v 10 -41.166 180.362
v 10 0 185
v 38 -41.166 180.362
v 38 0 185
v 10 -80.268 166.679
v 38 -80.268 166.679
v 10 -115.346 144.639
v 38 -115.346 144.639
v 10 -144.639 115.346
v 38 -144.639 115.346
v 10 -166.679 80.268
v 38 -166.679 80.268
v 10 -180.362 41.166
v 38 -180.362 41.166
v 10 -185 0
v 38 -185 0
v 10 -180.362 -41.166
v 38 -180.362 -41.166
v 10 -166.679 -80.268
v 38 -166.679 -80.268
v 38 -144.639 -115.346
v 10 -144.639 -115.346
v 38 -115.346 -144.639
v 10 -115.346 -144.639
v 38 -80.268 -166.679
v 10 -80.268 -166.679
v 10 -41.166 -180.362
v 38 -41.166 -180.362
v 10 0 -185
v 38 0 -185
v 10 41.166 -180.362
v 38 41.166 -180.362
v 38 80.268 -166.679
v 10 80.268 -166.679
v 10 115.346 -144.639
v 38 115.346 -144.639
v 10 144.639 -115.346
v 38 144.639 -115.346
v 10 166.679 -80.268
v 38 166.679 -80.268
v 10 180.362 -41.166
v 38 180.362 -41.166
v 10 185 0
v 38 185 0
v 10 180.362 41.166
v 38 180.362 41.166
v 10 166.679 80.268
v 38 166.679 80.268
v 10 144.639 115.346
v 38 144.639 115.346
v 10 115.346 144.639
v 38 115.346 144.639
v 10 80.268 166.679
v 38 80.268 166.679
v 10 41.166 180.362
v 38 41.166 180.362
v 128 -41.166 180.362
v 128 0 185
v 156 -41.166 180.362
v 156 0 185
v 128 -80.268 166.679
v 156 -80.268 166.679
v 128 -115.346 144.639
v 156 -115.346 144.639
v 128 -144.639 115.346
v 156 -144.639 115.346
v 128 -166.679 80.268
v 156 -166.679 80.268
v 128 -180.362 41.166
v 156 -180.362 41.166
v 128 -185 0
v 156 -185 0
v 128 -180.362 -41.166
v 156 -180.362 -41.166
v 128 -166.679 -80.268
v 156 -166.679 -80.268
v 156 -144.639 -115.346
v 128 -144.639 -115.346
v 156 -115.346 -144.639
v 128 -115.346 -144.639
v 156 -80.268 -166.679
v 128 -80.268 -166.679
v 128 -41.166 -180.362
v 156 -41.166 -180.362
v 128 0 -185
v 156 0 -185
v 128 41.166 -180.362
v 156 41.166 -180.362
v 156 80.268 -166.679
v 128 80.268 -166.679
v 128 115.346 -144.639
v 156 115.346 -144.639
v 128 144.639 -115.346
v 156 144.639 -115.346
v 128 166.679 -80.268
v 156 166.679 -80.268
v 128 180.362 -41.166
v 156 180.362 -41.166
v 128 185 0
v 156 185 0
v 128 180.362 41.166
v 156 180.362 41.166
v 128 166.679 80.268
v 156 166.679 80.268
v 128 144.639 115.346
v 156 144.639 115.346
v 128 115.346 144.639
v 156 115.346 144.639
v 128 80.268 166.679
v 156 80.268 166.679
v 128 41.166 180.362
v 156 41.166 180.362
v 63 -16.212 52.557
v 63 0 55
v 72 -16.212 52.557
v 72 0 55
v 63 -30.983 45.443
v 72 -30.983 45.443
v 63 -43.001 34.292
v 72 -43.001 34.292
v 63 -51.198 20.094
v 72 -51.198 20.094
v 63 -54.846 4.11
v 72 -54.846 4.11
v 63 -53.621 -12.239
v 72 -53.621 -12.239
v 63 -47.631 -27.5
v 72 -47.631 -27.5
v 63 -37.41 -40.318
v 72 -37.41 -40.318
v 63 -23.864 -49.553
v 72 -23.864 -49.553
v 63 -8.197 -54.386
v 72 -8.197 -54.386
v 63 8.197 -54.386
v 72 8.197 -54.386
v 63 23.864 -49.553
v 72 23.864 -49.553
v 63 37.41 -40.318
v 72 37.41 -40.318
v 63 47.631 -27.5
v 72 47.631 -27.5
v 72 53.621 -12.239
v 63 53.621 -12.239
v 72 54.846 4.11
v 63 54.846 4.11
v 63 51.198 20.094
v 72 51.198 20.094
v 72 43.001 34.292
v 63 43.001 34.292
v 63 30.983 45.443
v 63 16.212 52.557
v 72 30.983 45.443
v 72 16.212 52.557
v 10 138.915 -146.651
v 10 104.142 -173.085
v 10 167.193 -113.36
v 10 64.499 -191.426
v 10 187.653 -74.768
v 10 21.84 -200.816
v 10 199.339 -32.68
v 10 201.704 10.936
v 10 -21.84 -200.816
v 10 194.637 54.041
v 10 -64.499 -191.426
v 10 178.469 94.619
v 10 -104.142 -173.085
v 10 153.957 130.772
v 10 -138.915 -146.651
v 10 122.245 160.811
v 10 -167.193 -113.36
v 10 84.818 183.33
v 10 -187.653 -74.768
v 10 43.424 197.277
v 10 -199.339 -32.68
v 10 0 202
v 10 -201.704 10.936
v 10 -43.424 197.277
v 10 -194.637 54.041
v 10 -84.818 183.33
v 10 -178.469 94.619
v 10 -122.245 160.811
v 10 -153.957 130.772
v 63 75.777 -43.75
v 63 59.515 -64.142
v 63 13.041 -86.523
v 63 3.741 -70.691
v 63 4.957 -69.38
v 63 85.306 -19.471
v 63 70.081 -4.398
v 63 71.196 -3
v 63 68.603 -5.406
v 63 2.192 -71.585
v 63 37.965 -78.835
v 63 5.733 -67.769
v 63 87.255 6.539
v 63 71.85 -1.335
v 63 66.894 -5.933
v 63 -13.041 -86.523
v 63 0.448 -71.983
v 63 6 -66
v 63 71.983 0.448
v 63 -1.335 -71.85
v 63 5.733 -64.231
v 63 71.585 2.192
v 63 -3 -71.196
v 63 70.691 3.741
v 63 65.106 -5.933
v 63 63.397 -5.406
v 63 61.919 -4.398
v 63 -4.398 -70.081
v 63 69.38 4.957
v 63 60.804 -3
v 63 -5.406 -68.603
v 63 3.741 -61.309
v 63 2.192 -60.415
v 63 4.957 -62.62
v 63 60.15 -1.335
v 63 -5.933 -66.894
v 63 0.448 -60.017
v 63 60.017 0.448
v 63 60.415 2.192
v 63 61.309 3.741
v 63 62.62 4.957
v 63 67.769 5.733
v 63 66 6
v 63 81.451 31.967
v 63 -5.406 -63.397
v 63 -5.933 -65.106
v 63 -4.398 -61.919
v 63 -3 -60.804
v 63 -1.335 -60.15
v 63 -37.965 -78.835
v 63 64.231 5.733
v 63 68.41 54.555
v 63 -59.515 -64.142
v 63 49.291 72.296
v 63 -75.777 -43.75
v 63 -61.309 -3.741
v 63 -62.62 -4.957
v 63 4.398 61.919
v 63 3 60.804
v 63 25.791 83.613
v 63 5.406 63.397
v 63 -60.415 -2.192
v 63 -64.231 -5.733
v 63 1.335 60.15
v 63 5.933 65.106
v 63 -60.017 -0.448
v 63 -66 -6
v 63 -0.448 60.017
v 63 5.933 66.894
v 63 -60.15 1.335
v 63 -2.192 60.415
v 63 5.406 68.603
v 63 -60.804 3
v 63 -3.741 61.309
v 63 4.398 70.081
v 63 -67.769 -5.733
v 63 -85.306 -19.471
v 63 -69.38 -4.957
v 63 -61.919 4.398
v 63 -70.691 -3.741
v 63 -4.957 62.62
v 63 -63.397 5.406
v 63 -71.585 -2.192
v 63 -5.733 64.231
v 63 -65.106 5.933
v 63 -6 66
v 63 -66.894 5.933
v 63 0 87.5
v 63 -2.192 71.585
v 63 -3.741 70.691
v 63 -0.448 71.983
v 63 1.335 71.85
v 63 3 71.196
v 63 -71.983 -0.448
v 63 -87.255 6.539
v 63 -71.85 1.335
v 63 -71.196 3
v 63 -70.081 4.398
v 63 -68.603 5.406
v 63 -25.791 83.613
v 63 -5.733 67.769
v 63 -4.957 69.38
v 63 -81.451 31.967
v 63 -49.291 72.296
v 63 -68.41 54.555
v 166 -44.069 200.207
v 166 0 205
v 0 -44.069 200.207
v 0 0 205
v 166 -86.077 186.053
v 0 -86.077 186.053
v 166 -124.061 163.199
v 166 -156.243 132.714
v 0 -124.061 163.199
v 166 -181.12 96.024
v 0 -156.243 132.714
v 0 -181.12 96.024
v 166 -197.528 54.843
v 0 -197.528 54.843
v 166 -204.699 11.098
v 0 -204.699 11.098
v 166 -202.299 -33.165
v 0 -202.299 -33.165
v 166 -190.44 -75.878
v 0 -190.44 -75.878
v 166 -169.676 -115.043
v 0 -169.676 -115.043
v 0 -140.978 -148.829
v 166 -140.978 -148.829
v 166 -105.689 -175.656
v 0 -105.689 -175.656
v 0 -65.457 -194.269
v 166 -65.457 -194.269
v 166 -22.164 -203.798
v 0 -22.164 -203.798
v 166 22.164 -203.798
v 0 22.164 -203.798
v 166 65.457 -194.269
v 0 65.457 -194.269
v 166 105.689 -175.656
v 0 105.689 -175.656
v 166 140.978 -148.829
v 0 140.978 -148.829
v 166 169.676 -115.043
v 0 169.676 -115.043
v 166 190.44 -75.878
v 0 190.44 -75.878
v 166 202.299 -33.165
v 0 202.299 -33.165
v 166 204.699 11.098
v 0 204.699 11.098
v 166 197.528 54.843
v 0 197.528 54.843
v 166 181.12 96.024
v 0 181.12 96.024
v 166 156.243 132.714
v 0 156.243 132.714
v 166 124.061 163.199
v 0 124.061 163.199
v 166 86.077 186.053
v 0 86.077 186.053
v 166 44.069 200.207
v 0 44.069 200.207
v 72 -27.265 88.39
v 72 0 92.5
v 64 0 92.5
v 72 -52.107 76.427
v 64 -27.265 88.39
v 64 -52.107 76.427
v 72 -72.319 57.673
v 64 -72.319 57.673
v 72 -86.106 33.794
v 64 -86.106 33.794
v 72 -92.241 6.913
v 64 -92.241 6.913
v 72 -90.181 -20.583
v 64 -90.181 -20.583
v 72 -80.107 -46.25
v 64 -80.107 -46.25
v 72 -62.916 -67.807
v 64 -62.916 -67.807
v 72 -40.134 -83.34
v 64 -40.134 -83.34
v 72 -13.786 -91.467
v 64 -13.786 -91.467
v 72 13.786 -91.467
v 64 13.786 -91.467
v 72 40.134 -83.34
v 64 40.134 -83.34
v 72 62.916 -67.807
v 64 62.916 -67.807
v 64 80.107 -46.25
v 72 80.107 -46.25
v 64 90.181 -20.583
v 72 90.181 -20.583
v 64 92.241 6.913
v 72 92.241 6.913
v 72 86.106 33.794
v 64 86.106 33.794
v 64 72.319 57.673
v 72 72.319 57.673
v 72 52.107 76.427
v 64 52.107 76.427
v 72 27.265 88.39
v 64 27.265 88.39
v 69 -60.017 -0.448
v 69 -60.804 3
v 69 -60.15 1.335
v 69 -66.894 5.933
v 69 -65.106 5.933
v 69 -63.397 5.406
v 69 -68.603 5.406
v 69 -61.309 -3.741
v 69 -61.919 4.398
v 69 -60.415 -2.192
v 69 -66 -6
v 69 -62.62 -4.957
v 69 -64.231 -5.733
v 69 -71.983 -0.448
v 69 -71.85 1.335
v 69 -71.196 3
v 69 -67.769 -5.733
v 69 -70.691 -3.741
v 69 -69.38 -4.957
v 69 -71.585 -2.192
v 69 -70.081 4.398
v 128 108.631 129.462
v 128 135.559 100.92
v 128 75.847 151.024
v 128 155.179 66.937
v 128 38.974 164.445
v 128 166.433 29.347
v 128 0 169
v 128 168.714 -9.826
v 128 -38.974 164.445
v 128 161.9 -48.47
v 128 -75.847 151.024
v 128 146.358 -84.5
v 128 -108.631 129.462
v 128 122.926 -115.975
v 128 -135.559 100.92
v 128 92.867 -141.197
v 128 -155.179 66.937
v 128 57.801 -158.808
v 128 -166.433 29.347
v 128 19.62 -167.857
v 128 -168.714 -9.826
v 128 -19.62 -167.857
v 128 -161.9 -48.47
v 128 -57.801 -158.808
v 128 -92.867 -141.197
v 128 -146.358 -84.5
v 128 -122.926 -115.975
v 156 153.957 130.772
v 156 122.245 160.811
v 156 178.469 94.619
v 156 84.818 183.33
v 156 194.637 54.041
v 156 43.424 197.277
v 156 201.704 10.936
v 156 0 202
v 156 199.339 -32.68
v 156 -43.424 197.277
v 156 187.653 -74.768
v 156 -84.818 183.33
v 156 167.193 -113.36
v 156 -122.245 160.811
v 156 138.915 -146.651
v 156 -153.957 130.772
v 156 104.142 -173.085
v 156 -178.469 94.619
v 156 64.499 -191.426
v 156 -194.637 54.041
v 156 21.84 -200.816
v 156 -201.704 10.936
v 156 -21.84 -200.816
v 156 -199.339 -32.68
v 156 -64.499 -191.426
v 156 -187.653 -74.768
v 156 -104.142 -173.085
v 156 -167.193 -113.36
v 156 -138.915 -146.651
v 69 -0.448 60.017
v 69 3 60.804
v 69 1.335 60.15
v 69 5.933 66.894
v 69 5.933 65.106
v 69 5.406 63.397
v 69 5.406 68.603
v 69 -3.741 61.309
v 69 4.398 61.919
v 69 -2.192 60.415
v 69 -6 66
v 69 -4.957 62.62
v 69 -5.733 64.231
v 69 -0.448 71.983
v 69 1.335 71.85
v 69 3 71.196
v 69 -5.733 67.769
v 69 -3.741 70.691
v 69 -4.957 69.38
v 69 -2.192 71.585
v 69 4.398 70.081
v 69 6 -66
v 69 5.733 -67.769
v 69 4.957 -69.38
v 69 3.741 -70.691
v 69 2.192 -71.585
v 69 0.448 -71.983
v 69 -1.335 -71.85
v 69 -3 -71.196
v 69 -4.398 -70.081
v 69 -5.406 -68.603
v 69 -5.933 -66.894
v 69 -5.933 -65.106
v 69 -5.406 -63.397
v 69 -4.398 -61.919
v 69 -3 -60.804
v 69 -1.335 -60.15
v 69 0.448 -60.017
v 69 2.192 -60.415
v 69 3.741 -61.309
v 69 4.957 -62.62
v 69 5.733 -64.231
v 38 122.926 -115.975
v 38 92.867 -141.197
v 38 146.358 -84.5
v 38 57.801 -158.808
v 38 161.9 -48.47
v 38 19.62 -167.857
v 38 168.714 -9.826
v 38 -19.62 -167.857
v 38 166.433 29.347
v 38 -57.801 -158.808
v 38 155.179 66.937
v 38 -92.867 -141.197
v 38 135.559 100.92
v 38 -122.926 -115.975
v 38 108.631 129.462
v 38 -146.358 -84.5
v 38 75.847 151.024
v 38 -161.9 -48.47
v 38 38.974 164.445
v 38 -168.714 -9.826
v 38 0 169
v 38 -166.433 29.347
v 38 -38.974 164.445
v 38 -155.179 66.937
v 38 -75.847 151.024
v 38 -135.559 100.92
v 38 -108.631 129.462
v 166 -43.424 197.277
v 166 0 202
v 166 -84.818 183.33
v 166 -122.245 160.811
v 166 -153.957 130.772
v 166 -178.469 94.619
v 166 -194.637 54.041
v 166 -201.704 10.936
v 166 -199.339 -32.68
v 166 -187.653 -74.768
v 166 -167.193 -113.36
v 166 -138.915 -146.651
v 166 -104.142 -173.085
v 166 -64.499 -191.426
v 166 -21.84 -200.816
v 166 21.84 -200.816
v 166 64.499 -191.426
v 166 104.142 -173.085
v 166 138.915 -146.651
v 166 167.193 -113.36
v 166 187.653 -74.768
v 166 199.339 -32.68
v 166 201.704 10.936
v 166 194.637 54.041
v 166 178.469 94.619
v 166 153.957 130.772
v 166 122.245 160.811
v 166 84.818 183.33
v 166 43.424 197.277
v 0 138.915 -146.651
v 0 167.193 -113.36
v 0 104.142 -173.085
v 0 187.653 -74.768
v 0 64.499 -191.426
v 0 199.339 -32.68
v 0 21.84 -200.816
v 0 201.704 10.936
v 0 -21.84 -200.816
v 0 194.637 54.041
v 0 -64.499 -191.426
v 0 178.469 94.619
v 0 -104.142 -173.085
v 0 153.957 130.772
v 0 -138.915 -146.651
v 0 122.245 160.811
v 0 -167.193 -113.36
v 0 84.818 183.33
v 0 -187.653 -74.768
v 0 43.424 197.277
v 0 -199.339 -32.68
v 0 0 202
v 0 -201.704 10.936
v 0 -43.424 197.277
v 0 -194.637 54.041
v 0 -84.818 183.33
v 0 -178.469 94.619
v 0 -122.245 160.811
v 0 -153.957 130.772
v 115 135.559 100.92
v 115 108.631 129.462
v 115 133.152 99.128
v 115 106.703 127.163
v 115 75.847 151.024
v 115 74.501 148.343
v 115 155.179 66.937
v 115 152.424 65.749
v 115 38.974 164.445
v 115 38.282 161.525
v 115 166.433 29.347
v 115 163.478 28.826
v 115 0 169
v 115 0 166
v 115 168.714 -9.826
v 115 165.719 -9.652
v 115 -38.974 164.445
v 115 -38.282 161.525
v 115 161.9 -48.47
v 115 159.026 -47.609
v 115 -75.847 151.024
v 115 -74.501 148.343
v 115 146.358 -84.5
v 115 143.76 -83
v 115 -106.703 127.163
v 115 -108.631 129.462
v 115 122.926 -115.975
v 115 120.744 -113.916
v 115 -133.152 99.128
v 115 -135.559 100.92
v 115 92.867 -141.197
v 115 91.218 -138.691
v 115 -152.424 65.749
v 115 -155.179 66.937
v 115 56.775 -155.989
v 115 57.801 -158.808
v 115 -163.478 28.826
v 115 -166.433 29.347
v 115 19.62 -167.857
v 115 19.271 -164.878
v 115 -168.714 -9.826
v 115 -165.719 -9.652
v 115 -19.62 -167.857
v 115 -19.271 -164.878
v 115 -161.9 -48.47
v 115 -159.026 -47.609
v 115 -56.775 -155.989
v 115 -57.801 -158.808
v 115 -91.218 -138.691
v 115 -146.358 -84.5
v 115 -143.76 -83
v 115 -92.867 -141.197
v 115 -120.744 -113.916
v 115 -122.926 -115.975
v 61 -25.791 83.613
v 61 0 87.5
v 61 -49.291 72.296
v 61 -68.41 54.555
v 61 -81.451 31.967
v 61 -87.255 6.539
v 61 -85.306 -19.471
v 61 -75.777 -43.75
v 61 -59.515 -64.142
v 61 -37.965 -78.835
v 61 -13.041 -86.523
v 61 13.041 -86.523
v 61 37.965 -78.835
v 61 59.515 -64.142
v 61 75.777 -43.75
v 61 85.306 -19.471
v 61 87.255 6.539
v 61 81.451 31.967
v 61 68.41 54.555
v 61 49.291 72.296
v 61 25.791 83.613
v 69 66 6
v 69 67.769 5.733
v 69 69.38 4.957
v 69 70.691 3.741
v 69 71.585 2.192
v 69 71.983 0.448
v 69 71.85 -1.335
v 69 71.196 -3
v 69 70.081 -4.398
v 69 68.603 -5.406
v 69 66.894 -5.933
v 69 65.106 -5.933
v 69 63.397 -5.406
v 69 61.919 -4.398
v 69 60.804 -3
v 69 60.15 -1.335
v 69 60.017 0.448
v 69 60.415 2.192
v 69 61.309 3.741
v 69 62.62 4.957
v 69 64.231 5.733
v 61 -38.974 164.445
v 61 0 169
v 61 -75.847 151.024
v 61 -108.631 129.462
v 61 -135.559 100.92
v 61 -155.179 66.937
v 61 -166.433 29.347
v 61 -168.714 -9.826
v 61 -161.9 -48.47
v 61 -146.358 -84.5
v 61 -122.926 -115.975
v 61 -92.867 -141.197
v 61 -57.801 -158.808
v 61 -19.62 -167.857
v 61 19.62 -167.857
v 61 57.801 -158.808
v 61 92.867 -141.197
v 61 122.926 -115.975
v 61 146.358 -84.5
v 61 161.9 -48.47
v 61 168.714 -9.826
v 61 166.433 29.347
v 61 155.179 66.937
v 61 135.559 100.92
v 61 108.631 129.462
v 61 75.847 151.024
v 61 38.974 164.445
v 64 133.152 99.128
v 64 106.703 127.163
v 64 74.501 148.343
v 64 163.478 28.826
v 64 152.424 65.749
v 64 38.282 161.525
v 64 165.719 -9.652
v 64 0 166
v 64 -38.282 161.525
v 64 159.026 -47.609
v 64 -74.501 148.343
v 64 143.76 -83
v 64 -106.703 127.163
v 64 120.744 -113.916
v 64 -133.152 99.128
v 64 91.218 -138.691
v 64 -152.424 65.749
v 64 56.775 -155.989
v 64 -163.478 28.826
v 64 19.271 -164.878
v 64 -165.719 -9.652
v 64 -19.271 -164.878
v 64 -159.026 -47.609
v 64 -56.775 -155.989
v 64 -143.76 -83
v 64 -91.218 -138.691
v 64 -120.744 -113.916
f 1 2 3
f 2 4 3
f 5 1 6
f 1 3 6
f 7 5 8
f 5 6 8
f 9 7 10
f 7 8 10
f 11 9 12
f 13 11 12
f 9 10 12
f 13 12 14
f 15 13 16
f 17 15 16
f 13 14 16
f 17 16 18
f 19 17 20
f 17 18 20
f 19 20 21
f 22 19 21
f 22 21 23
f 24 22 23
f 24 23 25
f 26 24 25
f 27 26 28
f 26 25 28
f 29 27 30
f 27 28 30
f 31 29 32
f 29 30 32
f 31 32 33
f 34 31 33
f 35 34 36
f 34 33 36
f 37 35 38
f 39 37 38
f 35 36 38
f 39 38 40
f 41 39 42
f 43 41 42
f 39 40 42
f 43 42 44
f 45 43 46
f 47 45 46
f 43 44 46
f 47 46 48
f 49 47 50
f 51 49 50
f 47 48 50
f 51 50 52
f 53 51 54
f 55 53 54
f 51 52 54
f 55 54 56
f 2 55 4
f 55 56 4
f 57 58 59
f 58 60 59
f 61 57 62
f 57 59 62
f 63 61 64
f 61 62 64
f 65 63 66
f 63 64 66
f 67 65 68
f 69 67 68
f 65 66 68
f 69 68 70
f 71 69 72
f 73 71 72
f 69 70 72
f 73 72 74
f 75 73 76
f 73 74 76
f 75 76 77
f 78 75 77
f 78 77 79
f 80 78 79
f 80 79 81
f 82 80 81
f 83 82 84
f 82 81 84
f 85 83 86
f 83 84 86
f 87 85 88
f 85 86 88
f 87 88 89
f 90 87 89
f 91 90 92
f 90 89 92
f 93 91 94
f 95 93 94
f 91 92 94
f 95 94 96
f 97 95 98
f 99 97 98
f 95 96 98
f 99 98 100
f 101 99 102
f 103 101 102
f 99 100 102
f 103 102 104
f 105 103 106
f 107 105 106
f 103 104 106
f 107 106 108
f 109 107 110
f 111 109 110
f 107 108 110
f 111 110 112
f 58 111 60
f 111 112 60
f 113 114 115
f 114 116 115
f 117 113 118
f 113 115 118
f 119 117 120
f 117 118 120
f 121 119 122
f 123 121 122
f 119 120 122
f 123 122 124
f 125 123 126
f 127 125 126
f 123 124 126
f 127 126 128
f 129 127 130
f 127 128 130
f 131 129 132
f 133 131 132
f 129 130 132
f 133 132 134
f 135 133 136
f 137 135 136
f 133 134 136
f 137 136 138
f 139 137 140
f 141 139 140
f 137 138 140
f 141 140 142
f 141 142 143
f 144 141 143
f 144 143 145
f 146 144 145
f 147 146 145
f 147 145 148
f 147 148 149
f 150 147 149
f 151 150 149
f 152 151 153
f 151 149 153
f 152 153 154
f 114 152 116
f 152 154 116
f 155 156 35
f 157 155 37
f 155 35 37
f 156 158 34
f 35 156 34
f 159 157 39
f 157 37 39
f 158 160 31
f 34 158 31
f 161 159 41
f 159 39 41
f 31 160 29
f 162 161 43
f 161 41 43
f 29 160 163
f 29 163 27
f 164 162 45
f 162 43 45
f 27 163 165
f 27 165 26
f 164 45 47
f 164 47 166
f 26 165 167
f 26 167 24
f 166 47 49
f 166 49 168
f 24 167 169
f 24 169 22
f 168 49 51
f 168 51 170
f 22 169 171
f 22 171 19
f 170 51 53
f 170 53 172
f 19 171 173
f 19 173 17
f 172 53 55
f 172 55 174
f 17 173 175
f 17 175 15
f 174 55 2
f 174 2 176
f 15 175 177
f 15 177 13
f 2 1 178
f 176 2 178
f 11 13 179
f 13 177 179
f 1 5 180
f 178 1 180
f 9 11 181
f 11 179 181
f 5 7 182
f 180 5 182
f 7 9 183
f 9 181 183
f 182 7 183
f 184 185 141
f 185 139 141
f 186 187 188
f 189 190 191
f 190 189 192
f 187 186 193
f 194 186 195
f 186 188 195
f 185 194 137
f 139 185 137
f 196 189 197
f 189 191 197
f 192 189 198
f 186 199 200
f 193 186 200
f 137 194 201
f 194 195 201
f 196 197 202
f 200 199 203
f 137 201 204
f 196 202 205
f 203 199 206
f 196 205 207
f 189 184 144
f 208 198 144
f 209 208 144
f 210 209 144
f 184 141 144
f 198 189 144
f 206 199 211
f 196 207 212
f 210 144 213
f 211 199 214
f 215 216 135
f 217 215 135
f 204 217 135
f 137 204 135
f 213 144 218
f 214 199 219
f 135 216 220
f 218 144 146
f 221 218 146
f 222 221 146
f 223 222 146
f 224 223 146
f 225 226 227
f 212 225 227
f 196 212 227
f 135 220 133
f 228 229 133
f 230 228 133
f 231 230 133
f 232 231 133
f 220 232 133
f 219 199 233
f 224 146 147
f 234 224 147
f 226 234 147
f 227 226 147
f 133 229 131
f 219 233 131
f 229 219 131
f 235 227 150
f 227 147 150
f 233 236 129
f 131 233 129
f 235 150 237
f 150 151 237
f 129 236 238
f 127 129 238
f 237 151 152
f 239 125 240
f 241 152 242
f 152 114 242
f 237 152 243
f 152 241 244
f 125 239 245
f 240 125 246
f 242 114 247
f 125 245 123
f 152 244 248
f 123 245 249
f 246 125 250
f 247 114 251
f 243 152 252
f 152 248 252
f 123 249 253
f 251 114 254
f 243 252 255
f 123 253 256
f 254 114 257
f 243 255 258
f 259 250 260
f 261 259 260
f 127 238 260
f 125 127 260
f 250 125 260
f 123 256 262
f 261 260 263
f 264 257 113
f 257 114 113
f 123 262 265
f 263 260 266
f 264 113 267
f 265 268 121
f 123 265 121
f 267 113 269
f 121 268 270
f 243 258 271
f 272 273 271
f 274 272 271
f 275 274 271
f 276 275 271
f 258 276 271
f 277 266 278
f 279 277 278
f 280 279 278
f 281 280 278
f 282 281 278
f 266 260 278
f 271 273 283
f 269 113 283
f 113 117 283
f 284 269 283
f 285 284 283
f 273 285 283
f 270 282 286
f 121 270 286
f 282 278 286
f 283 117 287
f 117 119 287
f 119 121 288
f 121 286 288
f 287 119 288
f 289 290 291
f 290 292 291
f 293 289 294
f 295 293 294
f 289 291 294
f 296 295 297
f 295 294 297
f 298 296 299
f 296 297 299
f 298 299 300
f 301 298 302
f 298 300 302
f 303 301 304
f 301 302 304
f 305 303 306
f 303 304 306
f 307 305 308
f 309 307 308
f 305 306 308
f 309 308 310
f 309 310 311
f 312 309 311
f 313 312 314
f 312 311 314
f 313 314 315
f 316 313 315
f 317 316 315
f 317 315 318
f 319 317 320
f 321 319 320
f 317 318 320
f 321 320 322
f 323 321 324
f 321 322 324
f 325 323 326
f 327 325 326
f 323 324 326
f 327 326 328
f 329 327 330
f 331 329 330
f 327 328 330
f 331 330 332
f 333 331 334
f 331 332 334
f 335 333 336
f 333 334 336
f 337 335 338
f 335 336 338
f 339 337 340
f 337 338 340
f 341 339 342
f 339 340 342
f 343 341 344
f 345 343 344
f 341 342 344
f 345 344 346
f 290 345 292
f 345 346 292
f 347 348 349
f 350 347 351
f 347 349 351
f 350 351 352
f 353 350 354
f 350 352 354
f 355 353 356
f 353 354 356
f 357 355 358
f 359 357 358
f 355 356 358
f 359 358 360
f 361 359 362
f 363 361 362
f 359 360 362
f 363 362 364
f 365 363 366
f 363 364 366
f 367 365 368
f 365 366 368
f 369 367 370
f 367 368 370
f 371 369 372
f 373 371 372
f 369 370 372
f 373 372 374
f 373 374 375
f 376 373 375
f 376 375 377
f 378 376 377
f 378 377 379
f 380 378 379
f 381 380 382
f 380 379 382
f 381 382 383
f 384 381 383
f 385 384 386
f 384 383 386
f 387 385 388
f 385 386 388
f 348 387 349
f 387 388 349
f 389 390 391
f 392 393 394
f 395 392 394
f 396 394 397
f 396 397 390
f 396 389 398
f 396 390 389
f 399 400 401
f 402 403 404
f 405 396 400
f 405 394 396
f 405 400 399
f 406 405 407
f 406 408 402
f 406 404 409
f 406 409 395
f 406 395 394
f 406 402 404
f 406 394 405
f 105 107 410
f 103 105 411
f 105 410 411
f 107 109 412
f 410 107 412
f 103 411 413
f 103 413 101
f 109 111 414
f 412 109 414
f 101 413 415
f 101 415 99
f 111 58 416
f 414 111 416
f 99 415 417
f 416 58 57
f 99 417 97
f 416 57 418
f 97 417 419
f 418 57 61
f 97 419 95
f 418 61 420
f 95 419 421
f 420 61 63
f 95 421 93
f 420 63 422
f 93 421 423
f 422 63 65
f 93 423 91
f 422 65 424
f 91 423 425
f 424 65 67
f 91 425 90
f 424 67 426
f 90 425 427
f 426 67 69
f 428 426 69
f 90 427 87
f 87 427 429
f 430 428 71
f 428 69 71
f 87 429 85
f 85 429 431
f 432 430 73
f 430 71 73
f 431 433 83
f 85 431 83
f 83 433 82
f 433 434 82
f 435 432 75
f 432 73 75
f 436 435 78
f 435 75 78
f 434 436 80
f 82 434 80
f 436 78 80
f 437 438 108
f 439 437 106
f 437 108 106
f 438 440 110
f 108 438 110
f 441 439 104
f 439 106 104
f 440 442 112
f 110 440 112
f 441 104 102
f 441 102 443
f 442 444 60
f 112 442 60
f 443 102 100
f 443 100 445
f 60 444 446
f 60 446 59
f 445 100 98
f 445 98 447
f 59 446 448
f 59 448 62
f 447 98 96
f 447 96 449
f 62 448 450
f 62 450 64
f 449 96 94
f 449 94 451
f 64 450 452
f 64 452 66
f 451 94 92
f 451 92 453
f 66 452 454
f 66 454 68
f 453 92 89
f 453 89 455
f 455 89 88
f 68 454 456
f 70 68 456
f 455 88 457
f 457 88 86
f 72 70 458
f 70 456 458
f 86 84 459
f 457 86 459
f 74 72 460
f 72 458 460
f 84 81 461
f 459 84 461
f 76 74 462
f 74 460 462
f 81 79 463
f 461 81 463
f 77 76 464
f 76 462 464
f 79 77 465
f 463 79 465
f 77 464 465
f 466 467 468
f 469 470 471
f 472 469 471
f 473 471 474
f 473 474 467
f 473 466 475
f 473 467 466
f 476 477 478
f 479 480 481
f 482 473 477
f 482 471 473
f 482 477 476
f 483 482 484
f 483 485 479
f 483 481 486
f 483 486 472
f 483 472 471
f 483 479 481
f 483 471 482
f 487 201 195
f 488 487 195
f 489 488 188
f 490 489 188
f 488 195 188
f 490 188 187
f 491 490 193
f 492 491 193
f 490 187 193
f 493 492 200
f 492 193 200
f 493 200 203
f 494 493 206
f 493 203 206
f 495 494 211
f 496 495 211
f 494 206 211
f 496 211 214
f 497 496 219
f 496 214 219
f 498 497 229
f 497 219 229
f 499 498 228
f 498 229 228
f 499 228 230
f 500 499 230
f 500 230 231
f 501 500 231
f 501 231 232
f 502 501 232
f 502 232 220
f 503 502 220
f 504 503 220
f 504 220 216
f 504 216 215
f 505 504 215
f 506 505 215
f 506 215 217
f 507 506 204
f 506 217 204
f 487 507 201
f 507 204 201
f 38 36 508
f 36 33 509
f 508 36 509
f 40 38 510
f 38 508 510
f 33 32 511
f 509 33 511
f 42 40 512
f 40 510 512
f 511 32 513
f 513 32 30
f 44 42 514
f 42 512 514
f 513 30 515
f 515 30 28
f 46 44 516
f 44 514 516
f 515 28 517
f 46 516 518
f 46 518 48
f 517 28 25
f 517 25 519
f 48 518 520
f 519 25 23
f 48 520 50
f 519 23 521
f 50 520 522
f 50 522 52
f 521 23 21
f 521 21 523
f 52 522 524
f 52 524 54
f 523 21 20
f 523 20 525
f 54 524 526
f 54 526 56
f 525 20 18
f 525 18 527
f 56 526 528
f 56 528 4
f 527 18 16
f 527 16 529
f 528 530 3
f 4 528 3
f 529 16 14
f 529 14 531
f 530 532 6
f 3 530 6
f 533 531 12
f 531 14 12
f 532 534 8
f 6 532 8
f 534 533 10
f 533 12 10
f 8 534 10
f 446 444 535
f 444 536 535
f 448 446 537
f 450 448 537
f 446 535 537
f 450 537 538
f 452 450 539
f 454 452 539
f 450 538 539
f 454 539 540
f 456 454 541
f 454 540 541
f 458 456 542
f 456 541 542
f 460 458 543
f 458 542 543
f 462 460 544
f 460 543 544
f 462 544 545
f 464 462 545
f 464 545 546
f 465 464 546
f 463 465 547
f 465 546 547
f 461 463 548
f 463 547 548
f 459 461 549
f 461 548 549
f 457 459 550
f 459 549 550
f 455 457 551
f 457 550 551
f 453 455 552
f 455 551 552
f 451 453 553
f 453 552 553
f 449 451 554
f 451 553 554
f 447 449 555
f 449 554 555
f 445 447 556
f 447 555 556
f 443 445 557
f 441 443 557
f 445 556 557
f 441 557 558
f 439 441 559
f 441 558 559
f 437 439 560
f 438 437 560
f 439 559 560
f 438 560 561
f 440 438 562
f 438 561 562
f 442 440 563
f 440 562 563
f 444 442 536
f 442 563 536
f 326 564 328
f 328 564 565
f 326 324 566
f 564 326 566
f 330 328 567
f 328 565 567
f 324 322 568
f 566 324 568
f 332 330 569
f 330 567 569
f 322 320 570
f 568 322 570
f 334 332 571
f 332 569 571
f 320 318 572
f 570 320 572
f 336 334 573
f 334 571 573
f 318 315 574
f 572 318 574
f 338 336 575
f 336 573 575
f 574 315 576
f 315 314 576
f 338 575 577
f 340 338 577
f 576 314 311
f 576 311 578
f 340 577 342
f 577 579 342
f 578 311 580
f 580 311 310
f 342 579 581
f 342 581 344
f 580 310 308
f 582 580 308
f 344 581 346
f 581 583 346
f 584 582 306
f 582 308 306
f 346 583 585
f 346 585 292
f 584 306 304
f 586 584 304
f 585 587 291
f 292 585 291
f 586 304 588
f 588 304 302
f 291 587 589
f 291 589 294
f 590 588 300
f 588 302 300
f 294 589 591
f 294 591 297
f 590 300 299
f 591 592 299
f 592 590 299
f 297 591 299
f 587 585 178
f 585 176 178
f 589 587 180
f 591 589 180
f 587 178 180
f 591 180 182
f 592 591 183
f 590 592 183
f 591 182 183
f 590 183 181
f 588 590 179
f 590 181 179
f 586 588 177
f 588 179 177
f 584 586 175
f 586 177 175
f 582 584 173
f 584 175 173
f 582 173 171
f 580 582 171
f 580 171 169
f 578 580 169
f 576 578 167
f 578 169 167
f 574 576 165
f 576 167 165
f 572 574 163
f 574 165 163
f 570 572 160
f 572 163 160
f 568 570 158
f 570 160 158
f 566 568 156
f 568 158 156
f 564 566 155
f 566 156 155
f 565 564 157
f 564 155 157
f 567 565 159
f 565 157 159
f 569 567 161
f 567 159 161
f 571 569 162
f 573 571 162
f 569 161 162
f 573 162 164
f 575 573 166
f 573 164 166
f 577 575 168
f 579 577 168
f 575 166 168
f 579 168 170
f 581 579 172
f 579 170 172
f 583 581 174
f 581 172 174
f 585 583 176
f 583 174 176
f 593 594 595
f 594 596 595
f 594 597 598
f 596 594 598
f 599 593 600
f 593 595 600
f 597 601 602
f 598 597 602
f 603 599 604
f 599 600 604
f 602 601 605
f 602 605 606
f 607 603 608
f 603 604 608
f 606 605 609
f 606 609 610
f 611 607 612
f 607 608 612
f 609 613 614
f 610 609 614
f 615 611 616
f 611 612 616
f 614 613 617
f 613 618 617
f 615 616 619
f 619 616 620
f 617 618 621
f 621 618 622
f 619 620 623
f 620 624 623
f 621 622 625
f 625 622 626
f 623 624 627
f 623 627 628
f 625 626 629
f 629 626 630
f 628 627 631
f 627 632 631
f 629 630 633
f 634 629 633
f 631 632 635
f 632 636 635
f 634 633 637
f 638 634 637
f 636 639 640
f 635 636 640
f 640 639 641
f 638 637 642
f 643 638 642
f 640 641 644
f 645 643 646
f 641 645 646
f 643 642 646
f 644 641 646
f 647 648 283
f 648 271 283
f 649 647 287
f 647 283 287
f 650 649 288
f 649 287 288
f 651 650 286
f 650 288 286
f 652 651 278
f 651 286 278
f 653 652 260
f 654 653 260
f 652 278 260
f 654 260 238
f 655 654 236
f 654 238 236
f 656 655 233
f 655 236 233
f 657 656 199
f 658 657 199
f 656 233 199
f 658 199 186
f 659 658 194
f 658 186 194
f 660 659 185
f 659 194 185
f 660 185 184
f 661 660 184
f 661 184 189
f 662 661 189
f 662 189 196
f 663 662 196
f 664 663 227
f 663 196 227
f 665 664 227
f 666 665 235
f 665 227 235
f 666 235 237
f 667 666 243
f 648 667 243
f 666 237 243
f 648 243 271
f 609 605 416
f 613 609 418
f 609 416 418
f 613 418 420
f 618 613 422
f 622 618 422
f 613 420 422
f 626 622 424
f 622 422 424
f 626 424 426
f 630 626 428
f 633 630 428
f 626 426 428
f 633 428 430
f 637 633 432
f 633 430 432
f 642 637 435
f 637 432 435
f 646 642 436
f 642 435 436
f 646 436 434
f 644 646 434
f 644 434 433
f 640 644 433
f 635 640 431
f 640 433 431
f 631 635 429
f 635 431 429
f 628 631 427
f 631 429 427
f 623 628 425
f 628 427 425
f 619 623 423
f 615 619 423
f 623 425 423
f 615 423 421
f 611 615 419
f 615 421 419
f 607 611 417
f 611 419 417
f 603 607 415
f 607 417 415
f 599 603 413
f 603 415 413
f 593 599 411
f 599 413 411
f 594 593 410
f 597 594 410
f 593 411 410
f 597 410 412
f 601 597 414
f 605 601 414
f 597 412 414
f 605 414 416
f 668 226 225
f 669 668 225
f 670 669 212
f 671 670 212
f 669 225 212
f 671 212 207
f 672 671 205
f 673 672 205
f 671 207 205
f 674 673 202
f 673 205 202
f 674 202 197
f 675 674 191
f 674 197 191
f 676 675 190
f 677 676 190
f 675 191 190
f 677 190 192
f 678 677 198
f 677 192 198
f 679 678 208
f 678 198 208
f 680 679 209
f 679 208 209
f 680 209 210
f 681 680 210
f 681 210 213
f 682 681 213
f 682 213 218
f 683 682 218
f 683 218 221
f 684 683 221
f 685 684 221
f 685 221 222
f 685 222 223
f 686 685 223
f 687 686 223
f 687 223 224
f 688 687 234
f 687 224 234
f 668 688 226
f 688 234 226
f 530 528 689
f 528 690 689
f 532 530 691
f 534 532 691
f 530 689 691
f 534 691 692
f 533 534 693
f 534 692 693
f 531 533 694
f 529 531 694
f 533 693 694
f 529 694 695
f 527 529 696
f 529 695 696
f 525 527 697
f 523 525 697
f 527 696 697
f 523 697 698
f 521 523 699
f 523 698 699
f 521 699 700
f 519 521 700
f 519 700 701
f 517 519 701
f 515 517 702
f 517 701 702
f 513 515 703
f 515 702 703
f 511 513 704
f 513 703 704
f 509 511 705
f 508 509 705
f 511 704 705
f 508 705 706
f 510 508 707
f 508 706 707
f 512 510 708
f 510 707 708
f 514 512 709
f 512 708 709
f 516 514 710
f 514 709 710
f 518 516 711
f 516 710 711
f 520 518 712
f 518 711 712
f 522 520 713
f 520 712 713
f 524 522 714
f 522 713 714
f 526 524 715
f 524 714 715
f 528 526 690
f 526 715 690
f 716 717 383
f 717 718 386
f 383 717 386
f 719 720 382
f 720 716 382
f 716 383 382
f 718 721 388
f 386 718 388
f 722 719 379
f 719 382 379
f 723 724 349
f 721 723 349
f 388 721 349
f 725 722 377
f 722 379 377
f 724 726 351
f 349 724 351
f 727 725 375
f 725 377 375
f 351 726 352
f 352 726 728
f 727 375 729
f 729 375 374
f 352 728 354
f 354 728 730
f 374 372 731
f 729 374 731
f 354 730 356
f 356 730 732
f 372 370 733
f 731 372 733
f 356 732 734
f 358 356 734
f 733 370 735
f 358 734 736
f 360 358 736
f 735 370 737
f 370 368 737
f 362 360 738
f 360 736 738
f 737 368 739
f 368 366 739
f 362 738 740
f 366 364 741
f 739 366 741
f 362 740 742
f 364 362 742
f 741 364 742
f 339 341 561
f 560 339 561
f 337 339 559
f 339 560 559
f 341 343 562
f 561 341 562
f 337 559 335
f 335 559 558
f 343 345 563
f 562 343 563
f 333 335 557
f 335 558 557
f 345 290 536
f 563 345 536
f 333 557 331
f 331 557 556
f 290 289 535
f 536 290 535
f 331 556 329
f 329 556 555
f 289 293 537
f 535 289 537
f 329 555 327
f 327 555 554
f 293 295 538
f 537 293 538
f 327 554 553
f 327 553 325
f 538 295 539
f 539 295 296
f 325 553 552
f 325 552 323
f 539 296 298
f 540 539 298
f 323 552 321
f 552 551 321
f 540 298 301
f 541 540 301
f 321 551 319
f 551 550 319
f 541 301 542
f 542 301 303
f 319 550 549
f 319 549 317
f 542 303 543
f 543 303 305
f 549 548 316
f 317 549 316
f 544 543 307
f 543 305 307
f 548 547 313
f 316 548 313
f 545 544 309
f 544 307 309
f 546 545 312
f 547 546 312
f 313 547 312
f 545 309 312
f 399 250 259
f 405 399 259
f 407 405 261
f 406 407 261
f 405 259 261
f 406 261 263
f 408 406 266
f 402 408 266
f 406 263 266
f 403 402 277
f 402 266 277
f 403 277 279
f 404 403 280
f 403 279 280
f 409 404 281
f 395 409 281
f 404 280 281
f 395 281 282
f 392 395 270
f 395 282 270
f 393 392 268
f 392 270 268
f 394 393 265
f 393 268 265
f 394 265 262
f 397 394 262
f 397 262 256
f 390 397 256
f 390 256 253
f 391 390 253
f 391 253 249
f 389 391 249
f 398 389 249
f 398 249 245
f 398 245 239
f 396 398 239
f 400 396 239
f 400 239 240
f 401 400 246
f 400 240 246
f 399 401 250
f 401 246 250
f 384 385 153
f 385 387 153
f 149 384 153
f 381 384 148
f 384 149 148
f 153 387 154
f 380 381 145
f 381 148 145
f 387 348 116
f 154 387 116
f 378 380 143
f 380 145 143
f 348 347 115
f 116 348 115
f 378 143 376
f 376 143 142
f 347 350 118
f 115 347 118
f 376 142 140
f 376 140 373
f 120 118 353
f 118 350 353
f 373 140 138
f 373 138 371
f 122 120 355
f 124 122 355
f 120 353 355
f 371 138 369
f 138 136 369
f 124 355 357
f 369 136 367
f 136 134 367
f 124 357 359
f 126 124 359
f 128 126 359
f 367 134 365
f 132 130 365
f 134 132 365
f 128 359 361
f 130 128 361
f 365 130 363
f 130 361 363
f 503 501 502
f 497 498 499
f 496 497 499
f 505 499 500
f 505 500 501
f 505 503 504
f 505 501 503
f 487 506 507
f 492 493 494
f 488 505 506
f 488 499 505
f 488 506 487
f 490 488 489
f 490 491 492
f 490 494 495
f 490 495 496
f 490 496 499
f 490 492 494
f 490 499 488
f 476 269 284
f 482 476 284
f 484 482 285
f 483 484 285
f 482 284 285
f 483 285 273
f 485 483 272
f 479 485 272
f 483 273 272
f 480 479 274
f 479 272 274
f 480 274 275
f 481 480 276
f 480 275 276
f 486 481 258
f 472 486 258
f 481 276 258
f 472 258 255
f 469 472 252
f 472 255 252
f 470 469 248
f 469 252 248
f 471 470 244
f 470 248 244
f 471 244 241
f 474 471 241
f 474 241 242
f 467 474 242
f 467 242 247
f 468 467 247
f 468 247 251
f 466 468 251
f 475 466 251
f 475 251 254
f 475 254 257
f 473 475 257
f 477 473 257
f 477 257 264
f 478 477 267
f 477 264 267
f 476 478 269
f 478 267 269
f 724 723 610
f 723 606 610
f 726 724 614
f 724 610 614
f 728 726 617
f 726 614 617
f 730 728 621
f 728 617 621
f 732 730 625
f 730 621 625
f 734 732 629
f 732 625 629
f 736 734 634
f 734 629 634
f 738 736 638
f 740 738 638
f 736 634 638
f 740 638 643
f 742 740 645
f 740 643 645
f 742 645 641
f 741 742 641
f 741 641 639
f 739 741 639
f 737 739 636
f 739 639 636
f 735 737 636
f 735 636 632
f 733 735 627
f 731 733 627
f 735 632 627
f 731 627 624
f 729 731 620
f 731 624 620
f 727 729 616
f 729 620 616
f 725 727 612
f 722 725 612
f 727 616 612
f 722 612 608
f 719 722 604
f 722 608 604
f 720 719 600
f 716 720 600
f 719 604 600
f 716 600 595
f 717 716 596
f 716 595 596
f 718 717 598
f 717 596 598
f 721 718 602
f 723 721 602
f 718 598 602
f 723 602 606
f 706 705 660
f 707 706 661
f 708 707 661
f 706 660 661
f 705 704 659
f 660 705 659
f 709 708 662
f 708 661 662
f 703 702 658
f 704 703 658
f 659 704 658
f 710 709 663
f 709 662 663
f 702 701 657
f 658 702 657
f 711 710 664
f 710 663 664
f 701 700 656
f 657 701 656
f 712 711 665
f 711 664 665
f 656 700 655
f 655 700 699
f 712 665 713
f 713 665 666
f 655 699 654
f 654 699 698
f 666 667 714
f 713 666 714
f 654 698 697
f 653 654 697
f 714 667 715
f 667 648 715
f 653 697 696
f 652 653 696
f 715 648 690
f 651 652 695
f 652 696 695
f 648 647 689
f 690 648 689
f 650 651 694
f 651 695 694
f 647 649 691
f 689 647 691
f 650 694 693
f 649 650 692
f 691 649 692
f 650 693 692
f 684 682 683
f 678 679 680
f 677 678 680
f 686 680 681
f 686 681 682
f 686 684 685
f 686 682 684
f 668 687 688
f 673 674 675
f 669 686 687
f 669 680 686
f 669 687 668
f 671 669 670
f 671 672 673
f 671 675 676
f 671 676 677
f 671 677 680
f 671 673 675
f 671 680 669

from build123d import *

# Parameters (mm, degrees)
F2_R            = 6
F3_DEPTH        = 6
F3_COPIES_COUNT = 4


# Not quite as in the source:
# - a pattern or mirror of a feature is missing from the dataset's text; its kind, count and spacing are read off the source's solid


with BuildPart() as f1:
    # F0 (on Front) → F1 (revolve)
    with BuildSketch(Plane.XZ):
        Polygon((166, 205), (0, 205), (0, 202), (10, 202), (10, 185), (38, 185), (38, 169), (61, 169), (61, 87.5), (63, 87.5), (63, 55), (72, 55), (72, 92.5), (64, 92.5), (64, 166), (115, 166), (115, 169), (128, 169), (128, 185), (156, 185), (156, 202), (166, 202), align=None)
    revolve(axis=Axis((83, 0, 0), (1, 0, 0)))

    # F2 (on face) → F3 (cut)
    with BuildSketch(Plane(origin=(63, 0, 0), x_dir=(0, -1, 0), z_dir=(-1, 0, 0))):
        with Locations((0, 66)):
            Circle(F2_R)
    f3 = extrude(amount=-F3_DEPTH, mode=Mode.SUBTRACT)

    # F3_copies: F3 ×4 about axis
    f3_copies_axis = Axis((0, 0, 0), (1, 0, 0))
    for i in range(1, F3_COPIES_COUNT):
        add(f3.rotate(f3_copies_axis, i * 360 / F3_COPIES_COUNT), mode=Mode.SUBTRACT)


solid = f1.part
